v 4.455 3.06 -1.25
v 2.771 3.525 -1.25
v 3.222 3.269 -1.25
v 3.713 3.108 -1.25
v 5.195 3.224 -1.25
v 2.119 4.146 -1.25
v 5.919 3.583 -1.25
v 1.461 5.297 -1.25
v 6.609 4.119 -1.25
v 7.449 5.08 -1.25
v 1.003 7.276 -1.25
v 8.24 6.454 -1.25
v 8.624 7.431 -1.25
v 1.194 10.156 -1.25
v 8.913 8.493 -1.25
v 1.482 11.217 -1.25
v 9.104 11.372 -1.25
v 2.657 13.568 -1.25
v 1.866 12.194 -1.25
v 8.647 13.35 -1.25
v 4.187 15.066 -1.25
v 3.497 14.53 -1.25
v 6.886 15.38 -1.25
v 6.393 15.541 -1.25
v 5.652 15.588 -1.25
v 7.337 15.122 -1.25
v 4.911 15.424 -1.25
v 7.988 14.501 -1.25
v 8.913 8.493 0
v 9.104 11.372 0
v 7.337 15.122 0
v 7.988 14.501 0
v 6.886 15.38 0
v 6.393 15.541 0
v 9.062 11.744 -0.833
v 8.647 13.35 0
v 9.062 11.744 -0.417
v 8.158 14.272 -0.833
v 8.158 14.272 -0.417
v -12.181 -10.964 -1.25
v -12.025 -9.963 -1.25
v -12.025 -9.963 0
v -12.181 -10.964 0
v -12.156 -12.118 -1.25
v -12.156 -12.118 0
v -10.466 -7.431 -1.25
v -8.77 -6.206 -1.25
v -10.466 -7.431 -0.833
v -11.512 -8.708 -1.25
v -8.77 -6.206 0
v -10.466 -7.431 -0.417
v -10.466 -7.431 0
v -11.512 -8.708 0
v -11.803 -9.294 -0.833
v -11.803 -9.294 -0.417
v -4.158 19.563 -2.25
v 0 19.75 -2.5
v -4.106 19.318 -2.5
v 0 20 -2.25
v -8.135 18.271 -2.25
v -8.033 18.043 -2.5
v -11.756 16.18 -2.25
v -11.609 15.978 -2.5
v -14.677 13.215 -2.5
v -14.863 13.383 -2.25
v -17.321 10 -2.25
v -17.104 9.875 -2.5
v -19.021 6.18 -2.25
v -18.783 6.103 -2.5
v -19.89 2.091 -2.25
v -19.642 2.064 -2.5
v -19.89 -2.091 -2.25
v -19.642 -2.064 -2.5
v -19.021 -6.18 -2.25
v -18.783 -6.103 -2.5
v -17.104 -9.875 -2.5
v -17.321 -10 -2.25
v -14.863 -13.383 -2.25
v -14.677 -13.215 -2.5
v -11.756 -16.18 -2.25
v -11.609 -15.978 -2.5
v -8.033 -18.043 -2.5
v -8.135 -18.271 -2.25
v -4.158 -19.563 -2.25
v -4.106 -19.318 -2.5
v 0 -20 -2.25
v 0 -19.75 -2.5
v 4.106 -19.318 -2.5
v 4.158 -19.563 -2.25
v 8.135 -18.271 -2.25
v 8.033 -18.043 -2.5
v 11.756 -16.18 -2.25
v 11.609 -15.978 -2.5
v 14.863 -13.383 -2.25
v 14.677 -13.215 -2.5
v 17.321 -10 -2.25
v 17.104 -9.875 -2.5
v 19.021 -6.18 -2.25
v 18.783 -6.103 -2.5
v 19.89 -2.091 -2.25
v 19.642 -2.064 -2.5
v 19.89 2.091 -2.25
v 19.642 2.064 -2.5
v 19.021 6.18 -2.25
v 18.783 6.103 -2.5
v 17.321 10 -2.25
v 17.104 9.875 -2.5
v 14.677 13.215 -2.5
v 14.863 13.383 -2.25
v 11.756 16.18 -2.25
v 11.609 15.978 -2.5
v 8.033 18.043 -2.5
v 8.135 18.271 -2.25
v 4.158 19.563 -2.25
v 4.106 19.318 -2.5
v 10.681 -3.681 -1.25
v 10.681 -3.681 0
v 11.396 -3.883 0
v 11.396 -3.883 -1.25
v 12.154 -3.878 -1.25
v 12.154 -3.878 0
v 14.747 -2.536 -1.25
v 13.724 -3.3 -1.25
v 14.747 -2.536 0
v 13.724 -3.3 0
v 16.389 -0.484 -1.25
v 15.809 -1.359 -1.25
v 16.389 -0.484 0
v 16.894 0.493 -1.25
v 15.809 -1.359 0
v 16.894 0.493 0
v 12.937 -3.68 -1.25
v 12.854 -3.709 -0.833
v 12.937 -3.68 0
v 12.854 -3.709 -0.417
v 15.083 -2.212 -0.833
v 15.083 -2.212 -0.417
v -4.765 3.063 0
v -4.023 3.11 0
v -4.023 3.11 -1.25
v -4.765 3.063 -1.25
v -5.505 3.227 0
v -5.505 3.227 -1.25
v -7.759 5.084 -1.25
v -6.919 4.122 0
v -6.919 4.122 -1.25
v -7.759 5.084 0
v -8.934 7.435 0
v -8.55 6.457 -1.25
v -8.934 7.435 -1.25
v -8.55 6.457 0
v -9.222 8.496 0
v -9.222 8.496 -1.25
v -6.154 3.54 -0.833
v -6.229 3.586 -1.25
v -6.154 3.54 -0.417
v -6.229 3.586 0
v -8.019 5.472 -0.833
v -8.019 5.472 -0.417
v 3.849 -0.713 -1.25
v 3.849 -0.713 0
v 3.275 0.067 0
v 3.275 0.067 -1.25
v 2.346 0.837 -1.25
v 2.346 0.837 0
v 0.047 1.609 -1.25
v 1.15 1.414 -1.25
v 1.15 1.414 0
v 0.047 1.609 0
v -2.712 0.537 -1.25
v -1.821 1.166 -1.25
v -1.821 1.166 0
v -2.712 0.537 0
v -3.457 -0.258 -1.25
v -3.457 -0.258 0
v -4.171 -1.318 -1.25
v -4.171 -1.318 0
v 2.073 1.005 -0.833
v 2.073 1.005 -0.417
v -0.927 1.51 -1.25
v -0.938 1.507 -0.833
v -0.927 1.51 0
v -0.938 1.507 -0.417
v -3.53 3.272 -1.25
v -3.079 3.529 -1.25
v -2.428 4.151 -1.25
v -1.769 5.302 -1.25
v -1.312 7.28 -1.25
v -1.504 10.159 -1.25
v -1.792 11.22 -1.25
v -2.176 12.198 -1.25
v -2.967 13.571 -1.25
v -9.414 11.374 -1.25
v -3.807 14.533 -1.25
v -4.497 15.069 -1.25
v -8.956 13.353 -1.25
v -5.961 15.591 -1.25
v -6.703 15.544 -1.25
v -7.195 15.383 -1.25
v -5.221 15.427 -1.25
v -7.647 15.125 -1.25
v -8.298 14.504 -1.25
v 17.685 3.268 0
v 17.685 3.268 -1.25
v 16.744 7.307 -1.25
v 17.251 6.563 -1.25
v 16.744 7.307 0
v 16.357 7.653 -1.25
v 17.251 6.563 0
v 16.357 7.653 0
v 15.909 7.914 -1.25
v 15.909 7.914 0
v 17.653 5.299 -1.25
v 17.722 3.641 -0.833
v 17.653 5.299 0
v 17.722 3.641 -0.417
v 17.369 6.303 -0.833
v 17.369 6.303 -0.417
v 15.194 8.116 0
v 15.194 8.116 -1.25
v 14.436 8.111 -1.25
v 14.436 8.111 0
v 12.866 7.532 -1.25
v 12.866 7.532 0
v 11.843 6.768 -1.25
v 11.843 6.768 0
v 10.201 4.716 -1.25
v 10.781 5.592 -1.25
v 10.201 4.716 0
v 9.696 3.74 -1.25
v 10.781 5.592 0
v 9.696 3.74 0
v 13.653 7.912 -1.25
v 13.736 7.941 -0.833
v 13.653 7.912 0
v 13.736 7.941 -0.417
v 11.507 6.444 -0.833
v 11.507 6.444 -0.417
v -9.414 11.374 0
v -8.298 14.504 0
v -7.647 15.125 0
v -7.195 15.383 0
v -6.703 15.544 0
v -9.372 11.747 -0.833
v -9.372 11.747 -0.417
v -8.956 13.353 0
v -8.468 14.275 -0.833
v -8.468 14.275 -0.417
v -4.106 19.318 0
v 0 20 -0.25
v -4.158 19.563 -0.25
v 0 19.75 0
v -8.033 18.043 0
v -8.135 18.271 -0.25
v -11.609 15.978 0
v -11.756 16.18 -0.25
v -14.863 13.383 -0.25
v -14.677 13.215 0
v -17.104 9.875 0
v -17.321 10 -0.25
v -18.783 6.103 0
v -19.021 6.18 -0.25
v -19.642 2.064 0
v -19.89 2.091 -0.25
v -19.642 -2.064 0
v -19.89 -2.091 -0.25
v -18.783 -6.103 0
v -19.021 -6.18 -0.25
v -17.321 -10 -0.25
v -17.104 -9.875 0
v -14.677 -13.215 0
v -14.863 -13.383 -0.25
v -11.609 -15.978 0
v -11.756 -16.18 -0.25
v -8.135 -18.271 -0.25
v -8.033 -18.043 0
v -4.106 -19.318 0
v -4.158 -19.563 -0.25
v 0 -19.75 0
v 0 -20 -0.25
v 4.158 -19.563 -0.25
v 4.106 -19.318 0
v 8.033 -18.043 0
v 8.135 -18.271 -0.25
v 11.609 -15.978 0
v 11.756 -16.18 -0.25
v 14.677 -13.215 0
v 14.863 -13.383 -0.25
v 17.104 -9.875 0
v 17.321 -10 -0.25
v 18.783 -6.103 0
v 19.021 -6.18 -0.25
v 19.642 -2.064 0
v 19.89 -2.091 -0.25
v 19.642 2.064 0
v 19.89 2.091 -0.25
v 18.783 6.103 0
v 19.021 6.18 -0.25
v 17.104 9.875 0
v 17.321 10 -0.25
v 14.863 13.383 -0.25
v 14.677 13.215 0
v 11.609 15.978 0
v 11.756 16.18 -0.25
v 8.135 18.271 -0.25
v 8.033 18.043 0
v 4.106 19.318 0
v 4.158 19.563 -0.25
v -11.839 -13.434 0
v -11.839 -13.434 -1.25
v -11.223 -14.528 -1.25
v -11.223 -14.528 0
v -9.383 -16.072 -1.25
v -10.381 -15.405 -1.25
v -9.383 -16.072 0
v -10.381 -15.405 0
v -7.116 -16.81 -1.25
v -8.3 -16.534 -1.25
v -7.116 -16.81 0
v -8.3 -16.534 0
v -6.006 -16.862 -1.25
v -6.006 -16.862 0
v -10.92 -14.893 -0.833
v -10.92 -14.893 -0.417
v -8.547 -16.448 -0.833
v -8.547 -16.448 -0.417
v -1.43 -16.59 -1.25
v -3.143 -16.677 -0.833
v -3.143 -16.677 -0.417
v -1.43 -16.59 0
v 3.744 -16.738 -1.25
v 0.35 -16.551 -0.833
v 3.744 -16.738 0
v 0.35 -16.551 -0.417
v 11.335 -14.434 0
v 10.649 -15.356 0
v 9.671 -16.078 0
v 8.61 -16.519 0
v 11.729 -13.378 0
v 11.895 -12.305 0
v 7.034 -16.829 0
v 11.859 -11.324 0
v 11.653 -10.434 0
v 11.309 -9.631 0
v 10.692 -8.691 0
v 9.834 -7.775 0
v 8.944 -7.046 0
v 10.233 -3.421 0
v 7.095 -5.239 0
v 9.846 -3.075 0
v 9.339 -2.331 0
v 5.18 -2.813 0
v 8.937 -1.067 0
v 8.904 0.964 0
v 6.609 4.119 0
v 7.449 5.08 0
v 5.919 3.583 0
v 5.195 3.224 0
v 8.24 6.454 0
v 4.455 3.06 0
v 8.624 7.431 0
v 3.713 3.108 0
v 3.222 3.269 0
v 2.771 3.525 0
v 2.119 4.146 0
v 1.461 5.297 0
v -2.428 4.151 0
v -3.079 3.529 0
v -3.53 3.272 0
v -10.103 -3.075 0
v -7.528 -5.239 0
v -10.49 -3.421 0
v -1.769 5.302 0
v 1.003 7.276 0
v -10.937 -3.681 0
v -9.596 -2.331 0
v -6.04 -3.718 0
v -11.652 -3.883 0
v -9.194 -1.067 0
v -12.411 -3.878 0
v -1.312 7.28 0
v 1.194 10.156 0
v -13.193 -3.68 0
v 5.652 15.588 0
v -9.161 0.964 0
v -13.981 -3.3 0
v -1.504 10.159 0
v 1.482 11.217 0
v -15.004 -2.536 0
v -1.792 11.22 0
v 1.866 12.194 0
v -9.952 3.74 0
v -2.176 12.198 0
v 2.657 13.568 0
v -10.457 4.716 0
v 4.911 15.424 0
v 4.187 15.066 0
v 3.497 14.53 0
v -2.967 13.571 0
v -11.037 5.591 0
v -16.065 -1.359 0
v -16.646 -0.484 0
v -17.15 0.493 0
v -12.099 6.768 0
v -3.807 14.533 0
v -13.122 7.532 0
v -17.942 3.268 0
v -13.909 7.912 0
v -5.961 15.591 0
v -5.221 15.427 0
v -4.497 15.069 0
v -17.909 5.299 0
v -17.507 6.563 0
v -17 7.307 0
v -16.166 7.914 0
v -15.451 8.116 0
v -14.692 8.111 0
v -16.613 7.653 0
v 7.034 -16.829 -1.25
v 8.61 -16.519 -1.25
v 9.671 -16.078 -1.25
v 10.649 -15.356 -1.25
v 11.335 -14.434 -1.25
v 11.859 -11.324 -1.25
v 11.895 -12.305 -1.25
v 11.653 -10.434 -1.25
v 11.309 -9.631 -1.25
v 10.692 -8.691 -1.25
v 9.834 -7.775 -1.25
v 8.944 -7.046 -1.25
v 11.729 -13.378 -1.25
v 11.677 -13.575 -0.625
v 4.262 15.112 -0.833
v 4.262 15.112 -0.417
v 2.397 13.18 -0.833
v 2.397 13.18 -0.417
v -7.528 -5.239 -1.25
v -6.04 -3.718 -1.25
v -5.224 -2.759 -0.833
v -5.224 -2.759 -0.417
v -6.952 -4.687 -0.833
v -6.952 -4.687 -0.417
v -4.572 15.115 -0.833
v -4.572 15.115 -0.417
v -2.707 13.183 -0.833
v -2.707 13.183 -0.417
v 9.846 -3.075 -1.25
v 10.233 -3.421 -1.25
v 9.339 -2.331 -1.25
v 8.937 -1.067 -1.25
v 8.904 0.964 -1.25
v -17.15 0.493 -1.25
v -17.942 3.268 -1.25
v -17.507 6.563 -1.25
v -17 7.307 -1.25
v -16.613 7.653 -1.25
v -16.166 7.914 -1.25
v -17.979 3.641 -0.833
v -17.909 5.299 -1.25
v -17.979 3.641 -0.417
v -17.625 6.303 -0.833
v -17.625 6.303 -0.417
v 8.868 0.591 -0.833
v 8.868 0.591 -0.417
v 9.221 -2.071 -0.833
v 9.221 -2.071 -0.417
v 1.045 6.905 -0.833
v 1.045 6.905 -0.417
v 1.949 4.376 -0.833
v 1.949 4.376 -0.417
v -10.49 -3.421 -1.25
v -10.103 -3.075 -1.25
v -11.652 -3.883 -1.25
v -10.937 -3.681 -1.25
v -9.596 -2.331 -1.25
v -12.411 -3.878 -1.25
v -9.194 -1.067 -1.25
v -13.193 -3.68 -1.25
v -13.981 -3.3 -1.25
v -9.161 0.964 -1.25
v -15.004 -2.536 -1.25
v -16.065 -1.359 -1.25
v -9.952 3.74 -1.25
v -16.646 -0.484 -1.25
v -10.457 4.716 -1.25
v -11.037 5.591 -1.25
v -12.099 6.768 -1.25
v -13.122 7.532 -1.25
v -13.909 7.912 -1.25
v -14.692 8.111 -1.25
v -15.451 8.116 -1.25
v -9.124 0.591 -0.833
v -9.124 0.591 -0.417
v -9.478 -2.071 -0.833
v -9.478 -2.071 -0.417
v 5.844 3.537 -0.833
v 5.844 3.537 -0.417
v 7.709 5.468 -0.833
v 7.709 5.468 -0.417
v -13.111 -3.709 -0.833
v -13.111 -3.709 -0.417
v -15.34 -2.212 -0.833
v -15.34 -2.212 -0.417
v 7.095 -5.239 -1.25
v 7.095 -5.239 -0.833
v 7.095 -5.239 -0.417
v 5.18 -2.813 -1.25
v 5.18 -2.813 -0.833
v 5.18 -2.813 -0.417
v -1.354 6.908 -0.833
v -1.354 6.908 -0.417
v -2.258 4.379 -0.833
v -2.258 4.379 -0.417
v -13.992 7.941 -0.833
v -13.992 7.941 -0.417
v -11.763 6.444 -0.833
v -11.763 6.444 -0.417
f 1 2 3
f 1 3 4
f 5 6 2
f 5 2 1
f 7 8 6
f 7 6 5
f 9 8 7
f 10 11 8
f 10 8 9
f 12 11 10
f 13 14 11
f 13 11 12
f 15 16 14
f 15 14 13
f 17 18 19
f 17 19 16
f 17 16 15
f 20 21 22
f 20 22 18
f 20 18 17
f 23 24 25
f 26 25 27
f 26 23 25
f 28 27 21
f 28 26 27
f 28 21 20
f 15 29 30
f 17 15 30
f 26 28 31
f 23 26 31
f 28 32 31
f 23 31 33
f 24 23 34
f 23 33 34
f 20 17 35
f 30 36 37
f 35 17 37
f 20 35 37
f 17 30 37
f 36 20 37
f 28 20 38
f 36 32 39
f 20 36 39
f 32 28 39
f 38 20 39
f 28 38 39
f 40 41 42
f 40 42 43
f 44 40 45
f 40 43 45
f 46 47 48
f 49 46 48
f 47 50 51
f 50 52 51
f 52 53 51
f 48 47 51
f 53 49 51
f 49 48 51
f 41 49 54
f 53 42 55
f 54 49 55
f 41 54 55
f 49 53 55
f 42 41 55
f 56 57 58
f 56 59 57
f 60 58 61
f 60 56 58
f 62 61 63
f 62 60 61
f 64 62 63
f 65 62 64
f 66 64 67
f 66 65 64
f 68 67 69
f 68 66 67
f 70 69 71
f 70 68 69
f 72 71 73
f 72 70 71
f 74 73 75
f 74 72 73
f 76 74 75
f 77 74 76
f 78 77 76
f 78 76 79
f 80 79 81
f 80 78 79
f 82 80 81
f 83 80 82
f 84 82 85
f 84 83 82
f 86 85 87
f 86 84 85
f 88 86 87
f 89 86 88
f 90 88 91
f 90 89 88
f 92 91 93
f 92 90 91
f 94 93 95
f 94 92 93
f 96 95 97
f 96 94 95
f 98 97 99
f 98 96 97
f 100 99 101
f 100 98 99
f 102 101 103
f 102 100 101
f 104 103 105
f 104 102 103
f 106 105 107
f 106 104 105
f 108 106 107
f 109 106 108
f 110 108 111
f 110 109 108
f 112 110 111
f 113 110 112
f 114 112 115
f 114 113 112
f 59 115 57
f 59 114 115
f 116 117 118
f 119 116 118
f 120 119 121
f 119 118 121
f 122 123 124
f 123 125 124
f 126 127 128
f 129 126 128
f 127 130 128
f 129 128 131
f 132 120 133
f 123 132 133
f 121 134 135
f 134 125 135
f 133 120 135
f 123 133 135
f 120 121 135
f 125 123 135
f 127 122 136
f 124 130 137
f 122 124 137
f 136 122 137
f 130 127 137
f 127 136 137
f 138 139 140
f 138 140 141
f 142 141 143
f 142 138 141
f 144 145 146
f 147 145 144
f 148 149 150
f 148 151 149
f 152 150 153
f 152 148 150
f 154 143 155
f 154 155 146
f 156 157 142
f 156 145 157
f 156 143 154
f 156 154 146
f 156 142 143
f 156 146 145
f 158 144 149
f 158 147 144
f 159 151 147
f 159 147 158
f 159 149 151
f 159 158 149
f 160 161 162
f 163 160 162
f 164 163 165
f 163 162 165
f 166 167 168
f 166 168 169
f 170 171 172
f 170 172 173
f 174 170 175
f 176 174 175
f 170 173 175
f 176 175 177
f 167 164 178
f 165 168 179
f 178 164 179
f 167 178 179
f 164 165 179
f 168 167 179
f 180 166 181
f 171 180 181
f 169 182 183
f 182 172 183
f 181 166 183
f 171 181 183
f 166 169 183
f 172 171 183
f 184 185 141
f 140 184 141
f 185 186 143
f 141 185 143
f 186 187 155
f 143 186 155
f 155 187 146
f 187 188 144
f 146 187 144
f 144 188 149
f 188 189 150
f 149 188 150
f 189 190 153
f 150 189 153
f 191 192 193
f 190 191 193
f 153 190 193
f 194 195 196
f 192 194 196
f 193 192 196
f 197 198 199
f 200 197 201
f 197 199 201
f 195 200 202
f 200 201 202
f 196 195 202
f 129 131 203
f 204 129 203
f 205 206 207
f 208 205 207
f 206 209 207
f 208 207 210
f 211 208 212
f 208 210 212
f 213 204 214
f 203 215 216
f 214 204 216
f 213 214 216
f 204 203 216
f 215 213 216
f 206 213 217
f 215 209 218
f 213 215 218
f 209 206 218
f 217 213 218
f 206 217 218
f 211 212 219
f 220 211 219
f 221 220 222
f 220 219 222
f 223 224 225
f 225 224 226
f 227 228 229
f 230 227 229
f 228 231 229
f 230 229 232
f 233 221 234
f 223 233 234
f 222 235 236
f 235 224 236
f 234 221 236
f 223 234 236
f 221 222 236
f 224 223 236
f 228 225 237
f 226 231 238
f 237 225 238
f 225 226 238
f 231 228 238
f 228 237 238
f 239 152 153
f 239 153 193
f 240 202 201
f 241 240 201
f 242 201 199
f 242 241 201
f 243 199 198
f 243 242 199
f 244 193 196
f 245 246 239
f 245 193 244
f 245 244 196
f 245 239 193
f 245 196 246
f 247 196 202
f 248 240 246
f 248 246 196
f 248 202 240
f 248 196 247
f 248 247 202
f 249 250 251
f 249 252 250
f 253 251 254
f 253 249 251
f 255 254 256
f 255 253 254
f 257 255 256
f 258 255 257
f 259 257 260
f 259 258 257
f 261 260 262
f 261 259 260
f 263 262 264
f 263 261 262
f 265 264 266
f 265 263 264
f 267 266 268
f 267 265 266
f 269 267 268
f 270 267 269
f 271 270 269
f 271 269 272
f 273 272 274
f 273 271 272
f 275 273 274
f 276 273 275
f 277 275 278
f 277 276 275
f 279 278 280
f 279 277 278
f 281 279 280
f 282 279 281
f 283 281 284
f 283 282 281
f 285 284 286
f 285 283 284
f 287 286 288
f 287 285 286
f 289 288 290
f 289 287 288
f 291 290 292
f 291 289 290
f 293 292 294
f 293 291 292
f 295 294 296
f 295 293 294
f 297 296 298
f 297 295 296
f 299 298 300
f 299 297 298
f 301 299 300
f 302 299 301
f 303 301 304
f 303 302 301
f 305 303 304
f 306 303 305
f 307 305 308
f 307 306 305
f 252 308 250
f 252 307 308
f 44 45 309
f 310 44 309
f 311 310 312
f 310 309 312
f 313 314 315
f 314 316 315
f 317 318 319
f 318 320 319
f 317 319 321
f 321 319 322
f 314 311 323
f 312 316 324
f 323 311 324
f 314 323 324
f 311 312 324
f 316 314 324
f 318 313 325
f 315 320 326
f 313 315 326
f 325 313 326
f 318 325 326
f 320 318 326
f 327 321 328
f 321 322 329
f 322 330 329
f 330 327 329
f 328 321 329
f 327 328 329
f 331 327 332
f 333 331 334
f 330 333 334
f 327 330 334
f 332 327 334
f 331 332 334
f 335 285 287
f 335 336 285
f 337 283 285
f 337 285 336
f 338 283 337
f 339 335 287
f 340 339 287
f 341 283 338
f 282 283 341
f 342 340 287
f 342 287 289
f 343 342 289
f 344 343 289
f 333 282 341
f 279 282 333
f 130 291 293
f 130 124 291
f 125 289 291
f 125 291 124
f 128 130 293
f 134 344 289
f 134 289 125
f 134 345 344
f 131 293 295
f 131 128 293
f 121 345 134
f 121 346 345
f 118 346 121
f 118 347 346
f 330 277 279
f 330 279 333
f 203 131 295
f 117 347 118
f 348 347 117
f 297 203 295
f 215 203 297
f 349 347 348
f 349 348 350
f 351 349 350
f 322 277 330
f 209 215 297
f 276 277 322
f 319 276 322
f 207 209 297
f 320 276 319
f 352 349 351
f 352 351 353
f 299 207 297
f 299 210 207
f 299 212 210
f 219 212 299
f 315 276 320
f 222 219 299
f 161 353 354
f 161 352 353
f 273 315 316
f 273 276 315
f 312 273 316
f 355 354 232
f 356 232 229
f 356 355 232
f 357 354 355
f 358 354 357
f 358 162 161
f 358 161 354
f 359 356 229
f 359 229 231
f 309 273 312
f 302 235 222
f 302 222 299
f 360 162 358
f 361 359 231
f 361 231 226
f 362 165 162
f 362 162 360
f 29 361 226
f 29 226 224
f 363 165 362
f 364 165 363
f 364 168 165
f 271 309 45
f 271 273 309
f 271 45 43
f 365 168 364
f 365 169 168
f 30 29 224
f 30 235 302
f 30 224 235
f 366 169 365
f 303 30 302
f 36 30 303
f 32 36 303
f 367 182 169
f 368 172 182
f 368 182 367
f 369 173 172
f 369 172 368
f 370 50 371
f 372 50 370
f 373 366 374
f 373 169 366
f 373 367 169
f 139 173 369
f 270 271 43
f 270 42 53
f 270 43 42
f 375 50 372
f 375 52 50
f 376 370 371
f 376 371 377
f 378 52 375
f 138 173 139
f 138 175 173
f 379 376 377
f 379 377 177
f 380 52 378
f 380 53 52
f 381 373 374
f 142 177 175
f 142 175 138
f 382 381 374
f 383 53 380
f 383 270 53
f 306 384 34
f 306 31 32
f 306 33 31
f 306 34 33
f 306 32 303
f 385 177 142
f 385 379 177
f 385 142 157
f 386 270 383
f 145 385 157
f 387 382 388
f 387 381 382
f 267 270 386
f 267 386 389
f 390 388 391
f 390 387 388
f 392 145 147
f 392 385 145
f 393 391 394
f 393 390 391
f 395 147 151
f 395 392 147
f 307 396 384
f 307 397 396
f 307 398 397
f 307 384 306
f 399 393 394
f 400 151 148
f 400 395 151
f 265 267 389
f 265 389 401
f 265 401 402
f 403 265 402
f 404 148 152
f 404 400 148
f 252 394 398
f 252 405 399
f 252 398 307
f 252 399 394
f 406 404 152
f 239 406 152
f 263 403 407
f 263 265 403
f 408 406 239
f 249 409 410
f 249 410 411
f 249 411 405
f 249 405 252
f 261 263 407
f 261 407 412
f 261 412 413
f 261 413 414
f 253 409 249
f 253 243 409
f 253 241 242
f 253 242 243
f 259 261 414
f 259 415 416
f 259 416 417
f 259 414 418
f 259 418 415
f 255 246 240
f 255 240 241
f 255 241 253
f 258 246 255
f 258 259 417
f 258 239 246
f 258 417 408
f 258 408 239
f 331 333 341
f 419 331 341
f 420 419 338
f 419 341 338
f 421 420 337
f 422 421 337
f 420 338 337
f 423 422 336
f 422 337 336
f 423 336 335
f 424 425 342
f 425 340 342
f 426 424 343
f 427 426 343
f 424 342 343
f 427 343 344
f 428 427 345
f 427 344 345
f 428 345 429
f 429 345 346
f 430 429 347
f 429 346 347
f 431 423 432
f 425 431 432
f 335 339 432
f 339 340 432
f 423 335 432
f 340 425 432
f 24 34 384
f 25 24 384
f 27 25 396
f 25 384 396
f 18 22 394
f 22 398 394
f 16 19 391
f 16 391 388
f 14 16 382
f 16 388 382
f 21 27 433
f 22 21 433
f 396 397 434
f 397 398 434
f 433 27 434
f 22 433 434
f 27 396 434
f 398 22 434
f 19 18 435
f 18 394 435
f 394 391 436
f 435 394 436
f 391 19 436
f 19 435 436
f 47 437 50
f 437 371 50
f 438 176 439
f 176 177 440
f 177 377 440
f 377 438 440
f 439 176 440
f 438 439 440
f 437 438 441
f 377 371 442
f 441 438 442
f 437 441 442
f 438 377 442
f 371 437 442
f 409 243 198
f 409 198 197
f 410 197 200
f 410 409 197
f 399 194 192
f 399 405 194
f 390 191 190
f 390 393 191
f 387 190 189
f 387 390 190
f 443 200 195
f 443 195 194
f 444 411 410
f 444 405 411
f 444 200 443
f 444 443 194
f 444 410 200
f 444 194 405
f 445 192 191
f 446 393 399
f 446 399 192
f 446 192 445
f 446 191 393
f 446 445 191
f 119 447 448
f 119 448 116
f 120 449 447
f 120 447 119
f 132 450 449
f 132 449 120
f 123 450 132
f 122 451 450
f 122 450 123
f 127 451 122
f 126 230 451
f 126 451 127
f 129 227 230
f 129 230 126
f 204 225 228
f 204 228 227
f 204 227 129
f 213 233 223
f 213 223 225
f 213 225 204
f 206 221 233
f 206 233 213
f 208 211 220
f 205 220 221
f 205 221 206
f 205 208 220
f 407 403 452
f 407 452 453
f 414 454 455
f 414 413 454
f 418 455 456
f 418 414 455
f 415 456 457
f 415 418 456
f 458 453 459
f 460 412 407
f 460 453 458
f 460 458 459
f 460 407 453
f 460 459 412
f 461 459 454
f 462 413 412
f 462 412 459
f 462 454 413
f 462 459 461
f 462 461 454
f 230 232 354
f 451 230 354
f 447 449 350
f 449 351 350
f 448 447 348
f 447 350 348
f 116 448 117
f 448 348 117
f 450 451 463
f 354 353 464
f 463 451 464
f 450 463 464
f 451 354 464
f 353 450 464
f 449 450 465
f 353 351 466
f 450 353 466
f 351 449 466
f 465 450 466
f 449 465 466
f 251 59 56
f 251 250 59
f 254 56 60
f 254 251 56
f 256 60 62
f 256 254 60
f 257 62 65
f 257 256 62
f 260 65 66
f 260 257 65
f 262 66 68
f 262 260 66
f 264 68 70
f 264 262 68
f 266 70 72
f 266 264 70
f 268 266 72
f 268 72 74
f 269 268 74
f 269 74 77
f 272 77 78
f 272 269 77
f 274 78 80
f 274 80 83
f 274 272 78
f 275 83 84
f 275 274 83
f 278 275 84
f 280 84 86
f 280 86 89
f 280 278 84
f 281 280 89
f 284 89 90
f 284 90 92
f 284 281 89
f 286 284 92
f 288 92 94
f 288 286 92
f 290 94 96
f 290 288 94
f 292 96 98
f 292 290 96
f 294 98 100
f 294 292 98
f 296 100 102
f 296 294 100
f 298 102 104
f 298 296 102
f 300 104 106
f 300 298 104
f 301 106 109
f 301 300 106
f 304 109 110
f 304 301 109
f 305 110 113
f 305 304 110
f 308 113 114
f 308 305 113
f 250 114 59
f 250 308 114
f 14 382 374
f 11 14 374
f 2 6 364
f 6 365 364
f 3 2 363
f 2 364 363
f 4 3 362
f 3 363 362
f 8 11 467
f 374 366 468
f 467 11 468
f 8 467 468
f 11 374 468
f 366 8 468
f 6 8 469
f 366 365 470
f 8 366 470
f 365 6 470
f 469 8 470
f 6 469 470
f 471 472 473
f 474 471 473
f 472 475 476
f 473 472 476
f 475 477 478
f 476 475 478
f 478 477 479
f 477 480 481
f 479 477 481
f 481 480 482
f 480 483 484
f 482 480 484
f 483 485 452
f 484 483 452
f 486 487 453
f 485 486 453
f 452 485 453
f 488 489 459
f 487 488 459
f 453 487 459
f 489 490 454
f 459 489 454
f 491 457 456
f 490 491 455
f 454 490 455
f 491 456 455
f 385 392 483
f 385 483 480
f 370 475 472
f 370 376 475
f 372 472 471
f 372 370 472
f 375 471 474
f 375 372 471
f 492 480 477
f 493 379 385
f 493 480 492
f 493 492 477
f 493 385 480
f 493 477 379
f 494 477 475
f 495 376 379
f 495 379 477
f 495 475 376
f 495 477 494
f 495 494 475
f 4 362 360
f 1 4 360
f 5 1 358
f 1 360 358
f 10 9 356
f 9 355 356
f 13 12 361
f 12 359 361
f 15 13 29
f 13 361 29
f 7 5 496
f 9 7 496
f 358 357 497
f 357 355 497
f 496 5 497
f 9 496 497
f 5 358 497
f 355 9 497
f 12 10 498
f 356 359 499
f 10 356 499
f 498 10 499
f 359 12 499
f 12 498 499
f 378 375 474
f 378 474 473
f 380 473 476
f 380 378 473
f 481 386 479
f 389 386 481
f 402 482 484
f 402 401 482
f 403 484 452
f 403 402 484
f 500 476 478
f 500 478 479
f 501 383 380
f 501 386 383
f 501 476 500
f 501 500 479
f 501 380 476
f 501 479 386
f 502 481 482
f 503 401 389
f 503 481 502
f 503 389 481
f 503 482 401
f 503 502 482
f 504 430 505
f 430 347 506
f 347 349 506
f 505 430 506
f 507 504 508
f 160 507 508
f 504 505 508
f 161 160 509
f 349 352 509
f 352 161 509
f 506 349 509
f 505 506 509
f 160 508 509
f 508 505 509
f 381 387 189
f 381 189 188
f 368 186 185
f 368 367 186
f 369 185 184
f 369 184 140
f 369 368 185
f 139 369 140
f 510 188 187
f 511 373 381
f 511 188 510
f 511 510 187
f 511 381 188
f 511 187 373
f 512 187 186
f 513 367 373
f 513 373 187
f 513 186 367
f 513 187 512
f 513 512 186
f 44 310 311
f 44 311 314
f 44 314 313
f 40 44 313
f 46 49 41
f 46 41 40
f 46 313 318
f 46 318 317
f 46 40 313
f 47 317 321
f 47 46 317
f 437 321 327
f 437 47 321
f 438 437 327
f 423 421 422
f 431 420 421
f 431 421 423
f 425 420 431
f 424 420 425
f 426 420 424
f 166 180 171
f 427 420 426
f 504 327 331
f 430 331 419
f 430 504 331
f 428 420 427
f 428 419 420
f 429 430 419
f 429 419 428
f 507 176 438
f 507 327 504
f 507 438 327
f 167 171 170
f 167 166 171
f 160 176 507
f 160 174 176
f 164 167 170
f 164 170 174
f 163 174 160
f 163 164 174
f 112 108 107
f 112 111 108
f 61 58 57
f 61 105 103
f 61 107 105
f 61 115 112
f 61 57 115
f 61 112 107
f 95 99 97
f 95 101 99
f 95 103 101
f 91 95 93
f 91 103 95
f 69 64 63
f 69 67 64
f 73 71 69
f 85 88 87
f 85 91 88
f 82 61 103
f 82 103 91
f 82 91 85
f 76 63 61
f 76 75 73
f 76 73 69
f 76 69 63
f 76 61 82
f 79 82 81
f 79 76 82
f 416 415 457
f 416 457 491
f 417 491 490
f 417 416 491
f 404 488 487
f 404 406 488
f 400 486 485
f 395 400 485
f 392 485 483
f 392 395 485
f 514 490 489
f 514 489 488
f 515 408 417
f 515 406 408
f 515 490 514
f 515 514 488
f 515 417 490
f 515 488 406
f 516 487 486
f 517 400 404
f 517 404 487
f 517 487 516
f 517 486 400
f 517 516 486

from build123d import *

# Parameters (mm, degrees)
POCKET_DEPTH = 1.25


with BuildPart() as part:
    # Sketch (on DatumPlane) → Revolution (revolve)
    with BuildSketch(Plane.YZ):
        Polygon((0, 0), (0, -2.5), (19.75, -2.5), (20, -2.25), (20, -0.25), (19.75, 0), align=None)
    revolve(axis=Axis((0, 0, 0), (0, 0, 1)))

    # Sketch005 → Pocket (cut)
    with BuildSketch(Plane.XY):
        with BuildLine():
            add(Edge.make_bspline(
                [(-9.952404, 3.739768), (-8.508605, 0.536828), (-8.949612, -2.784858), (-10.937289, -3.681478)],
                knots=[0, 0, 0, 0, 1, 1, 1, 1], degree=3))
            add(Edge.make_bspline(
                [(-10.937289, -3.681478), (-12.92503, -4.578098), (-15.706774, -2.709293), (-17.150447, 0.493013)],
                knots=[0, 0, 0, 0, 1, 1, 1, 1], degree=3))
            add(Edge.make_bspline(
                [(-17.150447, 0.493013), (-18.594246, 3.695318), (-18.153302, 7.01732), (-16.165562, 7.913813)],
                knots=[0, 0, 0, 0, 1, 1, 1, 1], degree=3))
            add(Edge.make_bspline(
                [(-16.165562, 7.913813), (-14.177821, 8.810052), (-11.396204, 6.941184), (-9.952404, 3.739768)],
                knots=[0, 0, 0, 0, 1, 1, 1, 1], degree=3))
        make_face()
        with BuildLine():
            add(Edge.make_bspline(
                [(9.695893, 3.739768), (8.25203, 0.536828), (8.693037, -2.784858), (10.680905, -3.681478)],
                knots=[0, 0, 0, 0, 1, 1, 1, 1], degree=3))
            add(Edge.make_bspline(
                [(10.680905, -3.681478), (12.668645, -4.578098), (15.450136, -2.709293), (16.894126, 0.493013)],
                knots=[0, 0, 0, 0, 1, 1, 1, 1], degree=3))
            add(Edge.make_bspline(
                [(16.894126, 0.493013), (18.337735, 3.695318), (17.896727, 7.01732), (15.90905, 7.913813)],
                knots=[0, 0, 0, 0, 1, 1, 1, 1], degree=3))
            add(Edge.make_bspline(
                [(15.90905, 7.913813), (13.921437, 8.810052), (11.139692, 6.941184), (9.695893, 3.739768)],
                knots=[0, 0, 0, 0, 1, 1, 1, 1], degree=3))
        make_face()
        with BuildLine():
            add(Edge.make_bspline(
                [(-1.503564, 10.159173), (-0.763484, 6.725792), (-1.8916, 3.570223), (-4.023162, 3.110483)],
                knots=[0, 0, 0, 0, 1, 1, 1, 1], degree=3))
            add(Edge.make_bspline(
                [(-4.023162, 3.110483), (-6.154565, 2.651378), (-8.482443, 5.062473), (-9.222408, 8.495537)],
                knots=[0, 0, 0, 0, 1, 1, 1, 1], degree=3))
            add(Edge.make_bspline(
                [(-9.222408, 8.495537), (-9.962374, 11.928855), (-8.834296, 15.084551), (-6.702779, 15.543846)],
                knots=[0, 0, 0, 0, 1, 1, 1, 1], degree=3))
            add(Edge.make_bspline(
                [(-6.702779, 15.543846), (-4.571281, 16.003332), (-2.243517, 13.592555), (-1.503564, 10.159173)],
                knots=[0, 0, 0, 0, 1, 1, 1, 1], degree=3))
        make_face()
        with BuildLine():
            add(Edge.make_bspline(
                [(1.194043, 10.156252), (0.454611, 6.722934), (1.581926, 3.567048), (3.713329, 3.107943)],
                knots=[0, 0, 0, 0, 1, 1, 1, 1], degree=3))
            add(Edge.make_bspline(
                [(3.713329, 3.107943), (5.844872, 2.648203), (8.172655, 5.059298), (8.912557, 8.492552)],
                knots=[0, 0, 0, 0, 1, 1, 1, 1], degree=3))
            add(Edge.make_bspline(
                [(8.912557, 8.492552), (9.652586, 11.925934), (8.524635, 15.08163), (6.393004, 15.540925)],
                knots=[0, 0, 0, 0, 1, 1, 1, 1], degree=3))
            add(Edge.make_bspline(
                [(6.393004, 15.540925), (4.261448, 16.000284), (1.933716, 13.589634), (1.194043, 10.156252)],
                knots=[0, 0, 0, 0, 1, 1, 1, 1], degree=3))
        make_face()
        with BuildLine():
            add(Edge.make_bspline(
                [(-4.171396, -1.318008), (-4.691613, -2.216533), (-7.102321, -5.190873), (-8.769717, -6.205603)],
                knots=[0, 0, 0, 0, 1, 1, 1, 1], degree=3))
            add(Edge.make_bspline(
                [(-8.769717, -6.205603), (-10.436973, -7.220333), (-12.503009, -8.706233), (-12.156299, -12.118088)],
                knots=[0, 0, 0, 0, 1, 1, 1, 1], degree=3))
            add(Edge.make_bspline(
                [(-12.156299, -12.118088), (-11.809779, -15.530578), (-8.309786, -16.991078), (-6.005708, -16.861538)],
                knots=[0, 0, 0, 0, 1, 1, 1, 1], degree=3))
            add(Edge.make_bspline(
                [(-6.005708, -16.861538), (-3.701502, -16.732633), (0.642698, -16.308453), (3.744273, -16.738348)],
                knots=[0, 0, 0, 0, 1, 1, 1, 1], degree=3))
            add(Edge.make_bspline(
                [(3.744273, -16.738348), (6.845695, -17.168243), (10.760153, -16.842488), (11.676839, -13.575413)],
                knots=[0, 0, 0, 0, 1, 1, 1, 1], degree=3))
            add(Edge.make_bspline(
                [(11.676839, -13.575413), (12.593525, -10.308338), (10.543364, -8.226808), (8.943545, -7.045708)],
                knots=[0, 0, 0, 0, 1, 1, 1, 1], degree=3))
            add(Edge.make_bspline(
                [(8.943545, -7.045708), (7.343789, -5.865243), (4.672217, -2.334008), (3.849137, -0.712853)],
                knots=[0, 0, 0, 0, 1, 1, 1, 1], degree=3))
            add(Edge.make_bspline(
                [(3.849137, -0.712853), (3.026177, 0.907668), (-1.162715, 3.875658), (-4.171396, -1.318008)],
                knots=[0, 0, 0, 0, 1, 1, 1, 1], degree=3))
        make_face()
    extrude(amount=-POCKET_DEPTH, mode=Mode.SUBTRACT)


solid = part.part
